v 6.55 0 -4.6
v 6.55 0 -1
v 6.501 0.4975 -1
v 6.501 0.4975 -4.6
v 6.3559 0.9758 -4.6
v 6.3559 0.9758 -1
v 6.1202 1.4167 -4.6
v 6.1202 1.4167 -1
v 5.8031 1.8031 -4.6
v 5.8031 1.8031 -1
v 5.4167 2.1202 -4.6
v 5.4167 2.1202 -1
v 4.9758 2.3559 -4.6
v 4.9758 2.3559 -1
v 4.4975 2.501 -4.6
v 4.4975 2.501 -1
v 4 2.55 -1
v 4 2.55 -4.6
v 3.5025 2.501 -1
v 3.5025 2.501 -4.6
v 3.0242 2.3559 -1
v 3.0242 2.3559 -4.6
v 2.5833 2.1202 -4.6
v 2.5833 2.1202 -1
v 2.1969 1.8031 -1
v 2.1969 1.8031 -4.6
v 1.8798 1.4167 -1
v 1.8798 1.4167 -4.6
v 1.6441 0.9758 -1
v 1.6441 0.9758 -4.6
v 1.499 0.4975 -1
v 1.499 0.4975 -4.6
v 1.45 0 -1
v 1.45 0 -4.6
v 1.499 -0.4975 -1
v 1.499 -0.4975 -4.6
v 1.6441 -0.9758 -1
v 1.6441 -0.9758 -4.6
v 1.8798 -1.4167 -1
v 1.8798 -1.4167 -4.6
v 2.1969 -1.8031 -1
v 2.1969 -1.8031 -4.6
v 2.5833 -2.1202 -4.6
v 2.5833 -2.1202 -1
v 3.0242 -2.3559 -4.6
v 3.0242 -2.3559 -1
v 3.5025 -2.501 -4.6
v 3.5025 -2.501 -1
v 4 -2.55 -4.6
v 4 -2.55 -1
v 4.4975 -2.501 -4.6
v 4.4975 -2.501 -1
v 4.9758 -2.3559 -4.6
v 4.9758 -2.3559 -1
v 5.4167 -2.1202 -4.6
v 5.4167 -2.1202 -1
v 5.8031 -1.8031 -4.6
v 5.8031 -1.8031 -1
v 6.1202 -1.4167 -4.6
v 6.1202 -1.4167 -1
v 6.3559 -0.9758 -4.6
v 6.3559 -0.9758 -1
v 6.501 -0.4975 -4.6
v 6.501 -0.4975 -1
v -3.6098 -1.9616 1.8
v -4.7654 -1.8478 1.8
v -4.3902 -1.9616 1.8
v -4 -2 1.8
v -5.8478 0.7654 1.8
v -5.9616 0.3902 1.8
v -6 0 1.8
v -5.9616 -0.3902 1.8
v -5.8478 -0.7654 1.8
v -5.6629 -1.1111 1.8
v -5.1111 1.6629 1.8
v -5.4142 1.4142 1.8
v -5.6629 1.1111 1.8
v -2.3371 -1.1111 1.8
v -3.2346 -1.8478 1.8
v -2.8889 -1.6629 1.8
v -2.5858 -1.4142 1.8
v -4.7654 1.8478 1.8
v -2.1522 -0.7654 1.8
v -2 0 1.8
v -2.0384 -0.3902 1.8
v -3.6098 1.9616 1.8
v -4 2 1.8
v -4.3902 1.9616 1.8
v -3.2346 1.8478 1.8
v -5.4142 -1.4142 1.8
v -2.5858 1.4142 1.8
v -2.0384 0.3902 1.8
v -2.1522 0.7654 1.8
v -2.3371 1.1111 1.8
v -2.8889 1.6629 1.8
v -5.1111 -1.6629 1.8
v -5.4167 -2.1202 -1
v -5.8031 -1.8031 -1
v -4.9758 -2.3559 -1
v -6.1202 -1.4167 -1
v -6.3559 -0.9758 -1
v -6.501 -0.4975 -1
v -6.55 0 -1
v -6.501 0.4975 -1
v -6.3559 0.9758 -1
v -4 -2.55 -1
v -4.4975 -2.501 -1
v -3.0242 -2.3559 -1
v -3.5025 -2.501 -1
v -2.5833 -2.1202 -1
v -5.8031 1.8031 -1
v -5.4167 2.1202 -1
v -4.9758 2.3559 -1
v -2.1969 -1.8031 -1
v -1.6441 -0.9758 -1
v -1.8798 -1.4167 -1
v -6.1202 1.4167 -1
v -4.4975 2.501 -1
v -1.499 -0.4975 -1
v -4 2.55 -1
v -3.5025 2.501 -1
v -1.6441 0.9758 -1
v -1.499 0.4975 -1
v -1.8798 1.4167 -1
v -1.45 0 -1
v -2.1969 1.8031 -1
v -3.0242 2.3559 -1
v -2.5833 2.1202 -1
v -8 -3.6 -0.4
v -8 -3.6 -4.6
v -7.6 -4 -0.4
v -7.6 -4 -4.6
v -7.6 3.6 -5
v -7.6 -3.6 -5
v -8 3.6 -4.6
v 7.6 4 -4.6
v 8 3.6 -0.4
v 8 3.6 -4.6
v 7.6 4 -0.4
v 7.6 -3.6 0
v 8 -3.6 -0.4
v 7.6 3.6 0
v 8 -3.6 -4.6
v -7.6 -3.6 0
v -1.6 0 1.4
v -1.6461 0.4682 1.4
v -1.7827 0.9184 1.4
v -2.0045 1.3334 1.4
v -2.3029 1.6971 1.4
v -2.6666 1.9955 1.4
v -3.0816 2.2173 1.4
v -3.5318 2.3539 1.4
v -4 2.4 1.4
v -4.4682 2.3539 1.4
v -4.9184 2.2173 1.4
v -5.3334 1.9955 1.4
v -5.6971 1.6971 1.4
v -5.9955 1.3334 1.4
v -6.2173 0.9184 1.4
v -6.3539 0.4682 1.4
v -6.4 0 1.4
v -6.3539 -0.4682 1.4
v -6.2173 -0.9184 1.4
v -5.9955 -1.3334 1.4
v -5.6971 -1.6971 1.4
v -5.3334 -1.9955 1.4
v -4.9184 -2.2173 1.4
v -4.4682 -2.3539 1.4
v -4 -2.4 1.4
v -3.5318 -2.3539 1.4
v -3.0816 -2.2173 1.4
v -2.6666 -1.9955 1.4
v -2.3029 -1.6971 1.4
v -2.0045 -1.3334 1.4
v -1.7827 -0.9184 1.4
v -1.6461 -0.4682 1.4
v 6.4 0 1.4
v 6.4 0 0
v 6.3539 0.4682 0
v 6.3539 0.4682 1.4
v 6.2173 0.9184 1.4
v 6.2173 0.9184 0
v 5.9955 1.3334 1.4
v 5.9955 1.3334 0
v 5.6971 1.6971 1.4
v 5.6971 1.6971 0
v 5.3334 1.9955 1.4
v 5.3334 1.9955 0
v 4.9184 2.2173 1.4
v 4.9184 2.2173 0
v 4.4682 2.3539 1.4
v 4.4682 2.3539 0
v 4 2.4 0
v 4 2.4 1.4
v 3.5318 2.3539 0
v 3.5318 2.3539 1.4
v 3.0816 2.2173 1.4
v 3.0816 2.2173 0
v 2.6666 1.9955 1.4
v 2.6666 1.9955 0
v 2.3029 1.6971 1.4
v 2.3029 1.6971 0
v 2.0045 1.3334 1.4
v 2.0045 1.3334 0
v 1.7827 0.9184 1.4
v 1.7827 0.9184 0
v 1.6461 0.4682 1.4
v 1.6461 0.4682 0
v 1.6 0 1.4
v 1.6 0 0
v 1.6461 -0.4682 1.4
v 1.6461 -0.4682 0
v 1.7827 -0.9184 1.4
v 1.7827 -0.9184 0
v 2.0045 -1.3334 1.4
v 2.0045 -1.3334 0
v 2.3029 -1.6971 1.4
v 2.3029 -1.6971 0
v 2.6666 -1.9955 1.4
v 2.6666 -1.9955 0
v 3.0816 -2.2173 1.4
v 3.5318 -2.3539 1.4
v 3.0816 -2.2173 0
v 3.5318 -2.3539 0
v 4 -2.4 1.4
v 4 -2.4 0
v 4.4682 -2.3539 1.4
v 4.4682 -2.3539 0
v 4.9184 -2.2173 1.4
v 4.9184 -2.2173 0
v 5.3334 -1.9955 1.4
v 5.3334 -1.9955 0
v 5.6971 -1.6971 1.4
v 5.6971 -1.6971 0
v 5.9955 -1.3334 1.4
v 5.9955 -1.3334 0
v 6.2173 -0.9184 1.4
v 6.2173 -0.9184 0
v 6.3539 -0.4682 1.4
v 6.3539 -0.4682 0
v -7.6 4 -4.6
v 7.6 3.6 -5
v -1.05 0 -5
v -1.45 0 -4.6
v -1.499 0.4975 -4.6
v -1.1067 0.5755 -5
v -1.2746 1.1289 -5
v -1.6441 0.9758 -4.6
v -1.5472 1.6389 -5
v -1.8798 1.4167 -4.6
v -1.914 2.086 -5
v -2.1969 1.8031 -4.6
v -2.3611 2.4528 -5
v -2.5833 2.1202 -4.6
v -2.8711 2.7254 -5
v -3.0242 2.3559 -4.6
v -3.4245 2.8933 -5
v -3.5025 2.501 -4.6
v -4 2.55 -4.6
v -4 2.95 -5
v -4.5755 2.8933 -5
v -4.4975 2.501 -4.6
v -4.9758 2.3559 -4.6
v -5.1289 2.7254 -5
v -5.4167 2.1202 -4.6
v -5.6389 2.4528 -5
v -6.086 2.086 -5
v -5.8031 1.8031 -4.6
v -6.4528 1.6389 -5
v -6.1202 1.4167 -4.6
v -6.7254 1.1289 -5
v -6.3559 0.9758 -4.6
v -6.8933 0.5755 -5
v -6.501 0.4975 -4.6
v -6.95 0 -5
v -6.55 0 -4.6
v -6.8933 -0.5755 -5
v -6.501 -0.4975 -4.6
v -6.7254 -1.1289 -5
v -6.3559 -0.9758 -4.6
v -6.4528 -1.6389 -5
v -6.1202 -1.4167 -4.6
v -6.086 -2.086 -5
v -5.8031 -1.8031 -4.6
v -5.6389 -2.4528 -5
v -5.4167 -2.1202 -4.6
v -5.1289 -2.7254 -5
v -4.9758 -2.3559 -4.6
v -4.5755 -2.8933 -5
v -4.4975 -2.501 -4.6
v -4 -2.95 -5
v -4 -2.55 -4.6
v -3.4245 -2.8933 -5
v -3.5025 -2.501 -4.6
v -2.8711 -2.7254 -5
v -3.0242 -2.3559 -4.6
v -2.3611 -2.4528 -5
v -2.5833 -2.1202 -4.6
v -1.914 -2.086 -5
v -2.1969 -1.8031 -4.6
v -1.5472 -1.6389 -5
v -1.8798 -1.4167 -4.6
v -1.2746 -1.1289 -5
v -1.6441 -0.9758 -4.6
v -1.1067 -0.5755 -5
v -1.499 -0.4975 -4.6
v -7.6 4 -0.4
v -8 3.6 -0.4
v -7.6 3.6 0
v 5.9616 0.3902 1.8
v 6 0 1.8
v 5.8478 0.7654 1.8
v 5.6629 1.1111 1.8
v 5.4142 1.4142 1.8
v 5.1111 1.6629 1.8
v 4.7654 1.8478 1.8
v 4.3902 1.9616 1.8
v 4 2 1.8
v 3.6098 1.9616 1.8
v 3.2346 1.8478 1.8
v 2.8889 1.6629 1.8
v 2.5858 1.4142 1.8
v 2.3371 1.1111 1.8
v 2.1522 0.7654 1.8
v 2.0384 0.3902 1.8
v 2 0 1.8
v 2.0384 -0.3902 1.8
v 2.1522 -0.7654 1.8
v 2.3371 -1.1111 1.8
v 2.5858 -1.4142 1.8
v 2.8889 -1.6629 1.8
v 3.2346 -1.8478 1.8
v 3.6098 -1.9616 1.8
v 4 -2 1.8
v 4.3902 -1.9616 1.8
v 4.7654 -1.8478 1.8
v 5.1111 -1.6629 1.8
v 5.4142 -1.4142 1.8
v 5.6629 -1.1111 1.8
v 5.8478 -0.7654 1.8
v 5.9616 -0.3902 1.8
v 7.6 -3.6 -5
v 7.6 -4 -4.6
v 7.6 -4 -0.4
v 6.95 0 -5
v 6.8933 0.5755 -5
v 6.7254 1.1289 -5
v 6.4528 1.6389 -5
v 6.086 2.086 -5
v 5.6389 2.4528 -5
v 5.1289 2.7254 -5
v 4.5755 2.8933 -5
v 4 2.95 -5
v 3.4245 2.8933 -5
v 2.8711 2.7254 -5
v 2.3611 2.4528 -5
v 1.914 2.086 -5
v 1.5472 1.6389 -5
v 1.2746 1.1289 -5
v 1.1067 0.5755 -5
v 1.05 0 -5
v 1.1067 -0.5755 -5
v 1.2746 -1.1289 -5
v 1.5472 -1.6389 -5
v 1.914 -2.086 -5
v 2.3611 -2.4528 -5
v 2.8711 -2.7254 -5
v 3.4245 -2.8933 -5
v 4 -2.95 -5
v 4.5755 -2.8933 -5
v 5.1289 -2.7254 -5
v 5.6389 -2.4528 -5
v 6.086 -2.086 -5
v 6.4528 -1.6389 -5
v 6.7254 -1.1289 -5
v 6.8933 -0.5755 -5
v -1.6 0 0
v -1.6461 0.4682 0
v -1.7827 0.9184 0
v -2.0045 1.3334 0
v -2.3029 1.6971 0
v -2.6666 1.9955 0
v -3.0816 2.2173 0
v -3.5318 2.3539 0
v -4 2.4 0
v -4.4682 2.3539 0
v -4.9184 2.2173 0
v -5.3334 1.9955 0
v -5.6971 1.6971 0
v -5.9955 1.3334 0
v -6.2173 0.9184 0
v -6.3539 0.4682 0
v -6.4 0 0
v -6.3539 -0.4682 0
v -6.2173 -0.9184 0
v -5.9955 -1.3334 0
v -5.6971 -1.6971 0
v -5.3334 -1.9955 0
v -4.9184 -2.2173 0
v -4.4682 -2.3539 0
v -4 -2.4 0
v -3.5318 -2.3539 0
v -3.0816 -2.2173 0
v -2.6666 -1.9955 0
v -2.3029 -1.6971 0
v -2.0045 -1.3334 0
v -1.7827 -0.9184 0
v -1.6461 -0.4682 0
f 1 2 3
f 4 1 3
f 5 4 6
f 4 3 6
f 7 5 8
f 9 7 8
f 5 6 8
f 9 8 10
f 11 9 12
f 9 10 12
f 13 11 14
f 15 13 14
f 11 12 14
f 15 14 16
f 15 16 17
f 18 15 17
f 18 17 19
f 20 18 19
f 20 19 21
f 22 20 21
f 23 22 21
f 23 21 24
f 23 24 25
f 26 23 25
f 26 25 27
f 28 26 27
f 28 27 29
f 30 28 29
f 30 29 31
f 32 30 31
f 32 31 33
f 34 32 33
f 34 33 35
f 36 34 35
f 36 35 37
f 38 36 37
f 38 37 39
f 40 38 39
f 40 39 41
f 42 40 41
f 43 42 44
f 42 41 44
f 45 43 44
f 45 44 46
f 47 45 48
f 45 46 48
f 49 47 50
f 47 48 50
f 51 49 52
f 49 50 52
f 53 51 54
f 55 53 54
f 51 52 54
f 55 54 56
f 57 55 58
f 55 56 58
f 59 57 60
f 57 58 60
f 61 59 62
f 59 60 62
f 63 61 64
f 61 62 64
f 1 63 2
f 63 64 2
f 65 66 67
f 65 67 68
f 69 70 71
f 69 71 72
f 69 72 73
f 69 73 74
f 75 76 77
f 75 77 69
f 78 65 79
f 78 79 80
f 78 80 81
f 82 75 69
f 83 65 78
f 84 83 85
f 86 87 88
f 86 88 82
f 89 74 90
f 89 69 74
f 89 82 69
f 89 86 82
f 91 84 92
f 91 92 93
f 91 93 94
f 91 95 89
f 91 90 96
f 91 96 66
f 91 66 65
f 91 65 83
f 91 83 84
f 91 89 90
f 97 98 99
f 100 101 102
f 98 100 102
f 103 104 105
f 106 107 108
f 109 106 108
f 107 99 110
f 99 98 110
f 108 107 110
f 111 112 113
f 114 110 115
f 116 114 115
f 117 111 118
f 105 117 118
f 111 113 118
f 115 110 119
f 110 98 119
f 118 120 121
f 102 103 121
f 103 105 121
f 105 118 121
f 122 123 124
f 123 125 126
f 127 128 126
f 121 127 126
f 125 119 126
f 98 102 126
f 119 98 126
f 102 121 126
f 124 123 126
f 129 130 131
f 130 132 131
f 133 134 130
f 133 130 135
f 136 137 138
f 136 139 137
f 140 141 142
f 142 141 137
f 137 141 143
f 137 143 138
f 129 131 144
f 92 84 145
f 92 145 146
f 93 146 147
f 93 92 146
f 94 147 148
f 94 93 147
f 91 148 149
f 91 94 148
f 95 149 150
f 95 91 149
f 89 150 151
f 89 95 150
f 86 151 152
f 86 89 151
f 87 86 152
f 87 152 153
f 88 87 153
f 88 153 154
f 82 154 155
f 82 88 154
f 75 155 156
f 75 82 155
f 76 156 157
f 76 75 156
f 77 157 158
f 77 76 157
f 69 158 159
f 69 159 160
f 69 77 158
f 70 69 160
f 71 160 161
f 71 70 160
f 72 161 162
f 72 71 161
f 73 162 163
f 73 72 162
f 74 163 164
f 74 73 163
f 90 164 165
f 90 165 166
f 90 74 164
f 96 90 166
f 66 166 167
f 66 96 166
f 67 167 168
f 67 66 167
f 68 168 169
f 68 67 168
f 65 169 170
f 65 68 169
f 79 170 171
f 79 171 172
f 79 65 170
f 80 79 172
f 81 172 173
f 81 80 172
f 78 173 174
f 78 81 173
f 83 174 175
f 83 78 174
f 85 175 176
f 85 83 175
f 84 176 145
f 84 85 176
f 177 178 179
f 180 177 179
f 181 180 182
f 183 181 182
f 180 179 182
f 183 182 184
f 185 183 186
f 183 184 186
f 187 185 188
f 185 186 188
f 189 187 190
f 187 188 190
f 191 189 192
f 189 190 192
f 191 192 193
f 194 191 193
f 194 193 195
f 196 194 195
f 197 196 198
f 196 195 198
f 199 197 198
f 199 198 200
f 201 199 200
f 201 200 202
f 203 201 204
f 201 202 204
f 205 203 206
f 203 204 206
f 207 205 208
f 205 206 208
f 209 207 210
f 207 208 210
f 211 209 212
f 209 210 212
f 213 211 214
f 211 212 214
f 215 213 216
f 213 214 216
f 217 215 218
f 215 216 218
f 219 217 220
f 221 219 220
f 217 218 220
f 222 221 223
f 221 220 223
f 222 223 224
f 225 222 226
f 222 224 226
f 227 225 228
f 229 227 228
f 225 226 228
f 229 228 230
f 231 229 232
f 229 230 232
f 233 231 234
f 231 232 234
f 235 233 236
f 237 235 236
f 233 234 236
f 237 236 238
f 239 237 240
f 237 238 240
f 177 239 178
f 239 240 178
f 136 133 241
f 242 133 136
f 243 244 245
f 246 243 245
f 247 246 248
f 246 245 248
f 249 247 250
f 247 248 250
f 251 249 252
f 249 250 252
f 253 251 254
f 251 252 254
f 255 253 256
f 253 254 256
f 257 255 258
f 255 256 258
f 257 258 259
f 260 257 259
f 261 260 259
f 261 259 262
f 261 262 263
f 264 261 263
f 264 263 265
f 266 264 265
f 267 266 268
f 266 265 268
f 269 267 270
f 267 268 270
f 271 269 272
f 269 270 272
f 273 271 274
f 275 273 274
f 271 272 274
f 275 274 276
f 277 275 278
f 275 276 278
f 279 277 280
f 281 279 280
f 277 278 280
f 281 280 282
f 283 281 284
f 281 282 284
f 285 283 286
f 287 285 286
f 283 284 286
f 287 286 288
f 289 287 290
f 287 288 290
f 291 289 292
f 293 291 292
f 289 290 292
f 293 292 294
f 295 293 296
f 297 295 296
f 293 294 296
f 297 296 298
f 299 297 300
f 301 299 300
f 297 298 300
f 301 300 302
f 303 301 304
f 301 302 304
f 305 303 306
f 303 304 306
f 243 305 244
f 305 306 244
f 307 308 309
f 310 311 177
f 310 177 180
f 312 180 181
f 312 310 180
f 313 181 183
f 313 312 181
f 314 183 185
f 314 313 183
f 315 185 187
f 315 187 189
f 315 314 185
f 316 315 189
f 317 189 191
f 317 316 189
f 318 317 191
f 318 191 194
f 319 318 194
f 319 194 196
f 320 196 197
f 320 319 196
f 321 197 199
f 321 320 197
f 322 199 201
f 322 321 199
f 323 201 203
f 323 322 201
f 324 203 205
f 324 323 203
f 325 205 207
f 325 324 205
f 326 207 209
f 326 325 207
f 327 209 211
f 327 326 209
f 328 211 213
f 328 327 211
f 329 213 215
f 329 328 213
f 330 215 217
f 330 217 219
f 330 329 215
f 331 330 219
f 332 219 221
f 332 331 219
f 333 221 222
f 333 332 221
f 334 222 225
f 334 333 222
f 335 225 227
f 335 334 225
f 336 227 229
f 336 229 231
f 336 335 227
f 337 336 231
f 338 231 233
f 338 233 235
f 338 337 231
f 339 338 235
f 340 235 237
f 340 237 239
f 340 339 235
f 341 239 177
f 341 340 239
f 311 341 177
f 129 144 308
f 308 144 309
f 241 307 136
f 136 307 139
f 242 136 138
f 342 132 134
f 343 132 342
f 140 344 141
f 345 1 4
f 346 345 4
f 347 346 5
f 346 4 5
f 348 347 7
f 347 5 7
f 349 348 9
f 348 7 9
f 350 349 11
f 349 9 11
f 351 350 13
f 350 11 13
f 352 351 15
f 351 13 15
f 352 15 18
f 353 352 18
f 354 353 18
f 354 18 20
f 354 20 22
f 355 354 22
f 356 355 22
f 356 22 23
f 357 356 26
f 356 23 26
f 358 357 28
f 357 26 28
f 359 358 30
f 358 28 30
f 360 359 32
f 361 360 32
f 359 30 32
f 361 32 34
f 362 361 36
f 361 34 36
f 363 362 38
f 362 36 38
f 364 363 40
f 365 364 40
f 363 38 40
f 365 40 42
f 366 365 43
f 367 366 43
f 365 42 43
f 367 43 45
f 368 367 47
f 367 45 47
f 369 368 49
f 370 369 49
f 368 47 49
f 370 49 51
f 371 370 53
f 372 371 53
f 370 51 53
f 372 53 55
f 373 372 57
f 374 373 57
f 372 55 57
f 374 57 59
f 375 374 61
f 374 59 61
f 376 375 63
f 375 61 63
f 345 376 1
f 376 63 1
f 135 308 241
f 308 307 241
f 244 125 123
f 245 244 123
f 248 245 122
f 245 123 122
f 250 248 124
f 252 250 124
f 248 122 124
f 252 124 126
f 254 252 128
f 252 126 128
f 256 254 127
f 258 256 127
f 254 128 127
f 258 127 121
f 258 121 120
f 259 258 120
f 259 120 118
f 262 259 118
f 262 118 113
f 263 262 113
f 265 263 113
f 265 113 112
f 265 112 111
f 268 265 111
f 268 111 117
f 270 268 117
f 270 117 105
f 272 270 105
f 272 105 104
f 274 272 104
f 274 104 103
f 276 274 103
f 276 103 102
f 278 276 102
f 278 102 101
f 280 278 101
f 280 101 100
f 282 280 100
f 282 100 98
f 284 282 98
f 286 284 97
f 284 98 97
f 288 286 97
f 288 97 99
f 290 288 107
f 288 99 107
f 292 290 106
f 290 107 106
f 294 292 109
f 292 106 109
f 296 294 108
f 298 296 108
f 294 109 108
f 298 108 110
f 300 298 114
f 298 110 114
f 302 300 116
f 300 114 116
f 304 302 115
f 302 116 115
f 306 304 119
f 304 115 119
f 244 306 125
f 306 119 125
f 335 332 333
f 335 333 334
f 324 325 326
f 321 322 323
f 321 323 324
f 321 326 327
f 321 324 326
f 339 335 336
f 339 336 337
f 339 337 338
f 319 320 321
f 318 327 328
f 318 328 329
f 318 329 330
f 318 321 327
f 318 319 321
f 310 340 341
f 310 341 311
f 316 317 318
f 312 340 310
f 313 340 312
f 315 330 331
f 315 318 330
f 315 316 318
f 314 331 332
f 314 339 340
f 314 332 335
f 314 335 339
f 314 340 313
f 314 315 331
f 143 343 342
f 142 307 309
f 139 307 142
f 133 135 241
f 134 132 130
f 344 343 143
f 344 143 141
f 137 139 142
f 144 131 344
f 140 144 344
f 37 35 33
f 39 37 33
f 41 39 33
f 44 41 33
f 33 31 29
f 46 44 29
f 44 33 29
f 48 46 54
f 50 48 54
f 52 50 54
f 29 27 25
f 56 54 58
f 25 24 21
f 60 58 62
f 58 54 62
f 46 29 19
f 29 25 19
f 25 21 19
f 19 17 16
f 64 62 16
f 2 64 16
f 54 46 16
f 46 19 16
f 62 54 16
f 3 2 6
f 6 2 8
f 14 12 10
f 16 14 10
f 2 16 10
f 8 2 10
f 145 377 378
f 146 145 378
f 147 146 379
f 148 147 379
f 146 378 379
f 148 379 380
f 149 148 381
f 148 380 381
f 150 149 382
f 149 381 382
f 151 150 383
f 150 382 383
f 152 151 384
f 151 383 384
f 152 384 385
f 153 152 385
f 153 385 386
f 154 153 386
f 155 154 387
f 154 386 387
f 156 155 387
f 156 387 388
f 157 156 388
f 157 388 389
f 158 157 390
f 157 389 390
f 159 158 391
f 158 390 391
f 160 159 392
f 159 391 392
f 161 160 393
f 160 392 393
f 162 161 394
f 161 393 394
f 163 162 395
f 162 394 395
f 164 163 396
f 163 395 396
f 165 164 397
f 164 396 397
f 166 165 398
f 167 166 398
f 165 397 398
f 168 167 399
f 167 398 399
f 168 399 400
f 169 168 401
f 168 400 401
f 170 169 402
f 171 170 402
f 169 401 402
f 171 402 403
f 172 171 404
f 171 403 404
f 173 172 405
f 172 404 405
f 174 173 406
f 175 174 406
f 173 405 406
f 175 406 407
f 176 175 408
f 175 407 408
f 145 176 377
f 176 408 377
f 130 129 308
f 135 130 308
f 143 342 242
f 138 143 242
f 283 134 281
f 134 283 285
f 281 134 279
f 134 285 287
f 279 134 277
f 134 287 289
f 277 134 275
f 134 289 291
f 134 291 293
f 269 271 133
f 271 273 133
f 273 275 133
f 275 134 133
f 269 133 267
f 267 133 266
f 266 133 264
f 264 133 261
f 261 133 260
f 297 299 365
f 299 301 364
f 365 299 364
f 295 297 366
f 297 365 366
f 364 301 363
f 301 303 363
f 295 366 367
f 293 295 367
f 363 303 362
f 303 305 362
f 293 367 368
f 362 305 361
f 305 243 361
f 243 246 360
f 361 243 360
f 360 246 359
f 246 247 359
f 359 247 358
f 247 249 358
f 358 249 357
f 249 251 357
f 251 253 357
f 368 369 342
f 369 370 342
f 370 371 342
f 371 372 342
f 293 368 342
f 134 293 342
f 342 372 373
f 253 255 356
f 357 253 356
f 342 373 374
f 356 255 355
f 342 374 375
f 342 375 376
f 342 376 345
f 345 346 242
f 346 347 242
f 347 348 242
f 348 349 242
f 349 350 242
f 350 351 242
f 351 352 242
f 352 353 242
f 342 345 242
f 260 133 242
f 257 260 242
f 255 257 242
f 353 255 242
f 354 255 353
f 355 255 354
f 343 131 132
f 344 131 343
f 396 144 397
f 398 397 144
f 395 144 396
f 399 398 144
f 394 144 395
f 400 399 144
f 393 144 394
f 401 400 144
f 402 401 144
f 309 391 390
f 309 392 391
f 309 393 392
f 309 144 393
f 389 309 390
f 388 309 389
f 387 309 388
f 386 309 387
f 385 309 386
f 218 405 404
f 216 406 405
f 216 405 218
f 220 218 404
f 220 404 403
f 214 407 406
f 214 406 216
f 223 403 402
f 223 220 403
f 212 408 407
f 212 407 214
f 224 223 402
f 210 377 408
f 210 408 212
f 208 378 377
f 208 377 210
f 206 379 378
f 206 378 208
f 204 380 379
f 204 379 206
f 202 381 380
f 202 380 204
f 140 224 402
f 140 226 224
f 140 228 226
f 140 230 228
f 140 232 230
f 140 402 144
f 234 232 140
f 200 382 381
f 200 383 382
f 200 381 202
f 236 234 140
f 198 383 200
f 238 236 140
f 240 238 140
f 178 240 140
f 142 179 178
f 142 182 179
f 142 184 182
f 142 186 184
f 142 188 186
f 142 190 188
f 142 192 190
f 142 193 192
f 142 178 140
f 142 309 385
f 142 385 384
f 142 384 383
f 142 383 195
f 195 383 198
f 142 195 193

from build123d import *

# Parameters (mm, degrees)
F0_W     = 16
F0_H     = 8
F0_W_2   = 14
F0_H_2   = 6
F0_R     = 2.995
F0_R_2   = 2.55
F0_R_3   = 2.4
F1_DEPTH = 1
F2_DEPTH = 1.8
F3_DEPTH = 5
F4_SIZE  = 0.4


# Not quite as in the source:
# - a feature names something its author has since deleted; it is built from what else it names


with BuildPart() as f1:
    # F0 (on Top) → F1 (new body)
    with BuildSketch(Plane.XY):
        Rectangle(F0_W, F0_H)
        Rectangle(F0_W_2, F0_H_2, mode=Mode.SUBTRACT)
        Rectangle(F0_W_2, F0_H_2)
        with Locations((-4, 0)):
            Circle(F0_R, mode=Mode.SUBTRACT)
        with Locations((4, 0)):
            Circle(F0_R, mode=Mode.SUBTRACT)
        with Locations((-4, 0)):
            Circle(F0_R)
        with Locations((-4, 0)):
            Circle(F0_R_2, mode=Mode.SUBTRACT)
        with Locations((4, 0)):
            Circle(F0_R)
        with Locations((4, 0)):
            Circle(F0_R_2, mode=Mode.SUBTRACT)
        with Locations((-4, 0)):
            Circle(F0_R_2)
        with Locations((-4, 0)):
            Circle(F0_R_3, mode=Mode.SUBTRACT)
        with Locations((4, 0)):
            Circle(F0_R_2)
        with Locations((4, 0)):
            Circle(F0_R_3, mode=Mode.SUBTRACT)
        with Locations((4, 0)):
            Circle(F0_R_3)
        with Locations((-4, 0)):
            Circle(F0_R_3)
    extrude(amount=-F1_DEPTH)

    # F0 (on Top) → F2 (join)
    with BuildSketch(Plane.XY):
        with Locations((-4, 0)):
            Circle(F0_R_3)
        with Locations((4, 0)):
            Circle(F0_R_3)
    extrude(amount=F2_DEPTH)

    # F0 (on Top) → F3 (join)
    with BuildSketch(Plane.XY):
        Rectangle(F0_W, F0_H)
        Rectangle(F0_W_2, F0_H_2, mode=Mode.SUBTRACT)
        Rectangle(F0_W_2, F0_H_2)
        with Locations((-4, 0)):
            Circle(F0_R, mode=Mode.SUBTRACT)
        with Locations((4, 0)):
            Circle(F0_R, mode=Mode.SUBTRACT)
        with Locations((4, 0)):
            Circle(F0_R)
        with Locations((4, 0)):
            Circle(F0_R_2, mode=Mode.SUBTRACT)
        with Locations((-4, 0)):
            Circle(F0_R)
        with Locations((-4, 0)):
            Circle(F0_R_2, mode=Mode.SUBTRACT)
    extrude(amount=-F3_DEPTH)

    # F4
    f4_edges = [f1.edges().sort_by_distance(p)[0] for p in [
        (-6.4, 0, 1.8),
        (1.6, 0, 1.8),
        (-8, -4, -2.5),
        (0, -4, -5),
        (8, -4, -2.5),
        (0, -4, 0),
        (-8, 4, -2.5),
        (-8, 0, -5),
        (-8, 0, 0),
        (8, 4, -2.5),
        (0, 4, -5),
        (0, 4, 0),
        (8, 0, -5),
        (8, 0, 0),
        (1.45, 0, -5),
        (-6.55, 0, -5),
    ]]
    chamfer(f4_edges, length=F4_SIZE)


solid = f1.part
